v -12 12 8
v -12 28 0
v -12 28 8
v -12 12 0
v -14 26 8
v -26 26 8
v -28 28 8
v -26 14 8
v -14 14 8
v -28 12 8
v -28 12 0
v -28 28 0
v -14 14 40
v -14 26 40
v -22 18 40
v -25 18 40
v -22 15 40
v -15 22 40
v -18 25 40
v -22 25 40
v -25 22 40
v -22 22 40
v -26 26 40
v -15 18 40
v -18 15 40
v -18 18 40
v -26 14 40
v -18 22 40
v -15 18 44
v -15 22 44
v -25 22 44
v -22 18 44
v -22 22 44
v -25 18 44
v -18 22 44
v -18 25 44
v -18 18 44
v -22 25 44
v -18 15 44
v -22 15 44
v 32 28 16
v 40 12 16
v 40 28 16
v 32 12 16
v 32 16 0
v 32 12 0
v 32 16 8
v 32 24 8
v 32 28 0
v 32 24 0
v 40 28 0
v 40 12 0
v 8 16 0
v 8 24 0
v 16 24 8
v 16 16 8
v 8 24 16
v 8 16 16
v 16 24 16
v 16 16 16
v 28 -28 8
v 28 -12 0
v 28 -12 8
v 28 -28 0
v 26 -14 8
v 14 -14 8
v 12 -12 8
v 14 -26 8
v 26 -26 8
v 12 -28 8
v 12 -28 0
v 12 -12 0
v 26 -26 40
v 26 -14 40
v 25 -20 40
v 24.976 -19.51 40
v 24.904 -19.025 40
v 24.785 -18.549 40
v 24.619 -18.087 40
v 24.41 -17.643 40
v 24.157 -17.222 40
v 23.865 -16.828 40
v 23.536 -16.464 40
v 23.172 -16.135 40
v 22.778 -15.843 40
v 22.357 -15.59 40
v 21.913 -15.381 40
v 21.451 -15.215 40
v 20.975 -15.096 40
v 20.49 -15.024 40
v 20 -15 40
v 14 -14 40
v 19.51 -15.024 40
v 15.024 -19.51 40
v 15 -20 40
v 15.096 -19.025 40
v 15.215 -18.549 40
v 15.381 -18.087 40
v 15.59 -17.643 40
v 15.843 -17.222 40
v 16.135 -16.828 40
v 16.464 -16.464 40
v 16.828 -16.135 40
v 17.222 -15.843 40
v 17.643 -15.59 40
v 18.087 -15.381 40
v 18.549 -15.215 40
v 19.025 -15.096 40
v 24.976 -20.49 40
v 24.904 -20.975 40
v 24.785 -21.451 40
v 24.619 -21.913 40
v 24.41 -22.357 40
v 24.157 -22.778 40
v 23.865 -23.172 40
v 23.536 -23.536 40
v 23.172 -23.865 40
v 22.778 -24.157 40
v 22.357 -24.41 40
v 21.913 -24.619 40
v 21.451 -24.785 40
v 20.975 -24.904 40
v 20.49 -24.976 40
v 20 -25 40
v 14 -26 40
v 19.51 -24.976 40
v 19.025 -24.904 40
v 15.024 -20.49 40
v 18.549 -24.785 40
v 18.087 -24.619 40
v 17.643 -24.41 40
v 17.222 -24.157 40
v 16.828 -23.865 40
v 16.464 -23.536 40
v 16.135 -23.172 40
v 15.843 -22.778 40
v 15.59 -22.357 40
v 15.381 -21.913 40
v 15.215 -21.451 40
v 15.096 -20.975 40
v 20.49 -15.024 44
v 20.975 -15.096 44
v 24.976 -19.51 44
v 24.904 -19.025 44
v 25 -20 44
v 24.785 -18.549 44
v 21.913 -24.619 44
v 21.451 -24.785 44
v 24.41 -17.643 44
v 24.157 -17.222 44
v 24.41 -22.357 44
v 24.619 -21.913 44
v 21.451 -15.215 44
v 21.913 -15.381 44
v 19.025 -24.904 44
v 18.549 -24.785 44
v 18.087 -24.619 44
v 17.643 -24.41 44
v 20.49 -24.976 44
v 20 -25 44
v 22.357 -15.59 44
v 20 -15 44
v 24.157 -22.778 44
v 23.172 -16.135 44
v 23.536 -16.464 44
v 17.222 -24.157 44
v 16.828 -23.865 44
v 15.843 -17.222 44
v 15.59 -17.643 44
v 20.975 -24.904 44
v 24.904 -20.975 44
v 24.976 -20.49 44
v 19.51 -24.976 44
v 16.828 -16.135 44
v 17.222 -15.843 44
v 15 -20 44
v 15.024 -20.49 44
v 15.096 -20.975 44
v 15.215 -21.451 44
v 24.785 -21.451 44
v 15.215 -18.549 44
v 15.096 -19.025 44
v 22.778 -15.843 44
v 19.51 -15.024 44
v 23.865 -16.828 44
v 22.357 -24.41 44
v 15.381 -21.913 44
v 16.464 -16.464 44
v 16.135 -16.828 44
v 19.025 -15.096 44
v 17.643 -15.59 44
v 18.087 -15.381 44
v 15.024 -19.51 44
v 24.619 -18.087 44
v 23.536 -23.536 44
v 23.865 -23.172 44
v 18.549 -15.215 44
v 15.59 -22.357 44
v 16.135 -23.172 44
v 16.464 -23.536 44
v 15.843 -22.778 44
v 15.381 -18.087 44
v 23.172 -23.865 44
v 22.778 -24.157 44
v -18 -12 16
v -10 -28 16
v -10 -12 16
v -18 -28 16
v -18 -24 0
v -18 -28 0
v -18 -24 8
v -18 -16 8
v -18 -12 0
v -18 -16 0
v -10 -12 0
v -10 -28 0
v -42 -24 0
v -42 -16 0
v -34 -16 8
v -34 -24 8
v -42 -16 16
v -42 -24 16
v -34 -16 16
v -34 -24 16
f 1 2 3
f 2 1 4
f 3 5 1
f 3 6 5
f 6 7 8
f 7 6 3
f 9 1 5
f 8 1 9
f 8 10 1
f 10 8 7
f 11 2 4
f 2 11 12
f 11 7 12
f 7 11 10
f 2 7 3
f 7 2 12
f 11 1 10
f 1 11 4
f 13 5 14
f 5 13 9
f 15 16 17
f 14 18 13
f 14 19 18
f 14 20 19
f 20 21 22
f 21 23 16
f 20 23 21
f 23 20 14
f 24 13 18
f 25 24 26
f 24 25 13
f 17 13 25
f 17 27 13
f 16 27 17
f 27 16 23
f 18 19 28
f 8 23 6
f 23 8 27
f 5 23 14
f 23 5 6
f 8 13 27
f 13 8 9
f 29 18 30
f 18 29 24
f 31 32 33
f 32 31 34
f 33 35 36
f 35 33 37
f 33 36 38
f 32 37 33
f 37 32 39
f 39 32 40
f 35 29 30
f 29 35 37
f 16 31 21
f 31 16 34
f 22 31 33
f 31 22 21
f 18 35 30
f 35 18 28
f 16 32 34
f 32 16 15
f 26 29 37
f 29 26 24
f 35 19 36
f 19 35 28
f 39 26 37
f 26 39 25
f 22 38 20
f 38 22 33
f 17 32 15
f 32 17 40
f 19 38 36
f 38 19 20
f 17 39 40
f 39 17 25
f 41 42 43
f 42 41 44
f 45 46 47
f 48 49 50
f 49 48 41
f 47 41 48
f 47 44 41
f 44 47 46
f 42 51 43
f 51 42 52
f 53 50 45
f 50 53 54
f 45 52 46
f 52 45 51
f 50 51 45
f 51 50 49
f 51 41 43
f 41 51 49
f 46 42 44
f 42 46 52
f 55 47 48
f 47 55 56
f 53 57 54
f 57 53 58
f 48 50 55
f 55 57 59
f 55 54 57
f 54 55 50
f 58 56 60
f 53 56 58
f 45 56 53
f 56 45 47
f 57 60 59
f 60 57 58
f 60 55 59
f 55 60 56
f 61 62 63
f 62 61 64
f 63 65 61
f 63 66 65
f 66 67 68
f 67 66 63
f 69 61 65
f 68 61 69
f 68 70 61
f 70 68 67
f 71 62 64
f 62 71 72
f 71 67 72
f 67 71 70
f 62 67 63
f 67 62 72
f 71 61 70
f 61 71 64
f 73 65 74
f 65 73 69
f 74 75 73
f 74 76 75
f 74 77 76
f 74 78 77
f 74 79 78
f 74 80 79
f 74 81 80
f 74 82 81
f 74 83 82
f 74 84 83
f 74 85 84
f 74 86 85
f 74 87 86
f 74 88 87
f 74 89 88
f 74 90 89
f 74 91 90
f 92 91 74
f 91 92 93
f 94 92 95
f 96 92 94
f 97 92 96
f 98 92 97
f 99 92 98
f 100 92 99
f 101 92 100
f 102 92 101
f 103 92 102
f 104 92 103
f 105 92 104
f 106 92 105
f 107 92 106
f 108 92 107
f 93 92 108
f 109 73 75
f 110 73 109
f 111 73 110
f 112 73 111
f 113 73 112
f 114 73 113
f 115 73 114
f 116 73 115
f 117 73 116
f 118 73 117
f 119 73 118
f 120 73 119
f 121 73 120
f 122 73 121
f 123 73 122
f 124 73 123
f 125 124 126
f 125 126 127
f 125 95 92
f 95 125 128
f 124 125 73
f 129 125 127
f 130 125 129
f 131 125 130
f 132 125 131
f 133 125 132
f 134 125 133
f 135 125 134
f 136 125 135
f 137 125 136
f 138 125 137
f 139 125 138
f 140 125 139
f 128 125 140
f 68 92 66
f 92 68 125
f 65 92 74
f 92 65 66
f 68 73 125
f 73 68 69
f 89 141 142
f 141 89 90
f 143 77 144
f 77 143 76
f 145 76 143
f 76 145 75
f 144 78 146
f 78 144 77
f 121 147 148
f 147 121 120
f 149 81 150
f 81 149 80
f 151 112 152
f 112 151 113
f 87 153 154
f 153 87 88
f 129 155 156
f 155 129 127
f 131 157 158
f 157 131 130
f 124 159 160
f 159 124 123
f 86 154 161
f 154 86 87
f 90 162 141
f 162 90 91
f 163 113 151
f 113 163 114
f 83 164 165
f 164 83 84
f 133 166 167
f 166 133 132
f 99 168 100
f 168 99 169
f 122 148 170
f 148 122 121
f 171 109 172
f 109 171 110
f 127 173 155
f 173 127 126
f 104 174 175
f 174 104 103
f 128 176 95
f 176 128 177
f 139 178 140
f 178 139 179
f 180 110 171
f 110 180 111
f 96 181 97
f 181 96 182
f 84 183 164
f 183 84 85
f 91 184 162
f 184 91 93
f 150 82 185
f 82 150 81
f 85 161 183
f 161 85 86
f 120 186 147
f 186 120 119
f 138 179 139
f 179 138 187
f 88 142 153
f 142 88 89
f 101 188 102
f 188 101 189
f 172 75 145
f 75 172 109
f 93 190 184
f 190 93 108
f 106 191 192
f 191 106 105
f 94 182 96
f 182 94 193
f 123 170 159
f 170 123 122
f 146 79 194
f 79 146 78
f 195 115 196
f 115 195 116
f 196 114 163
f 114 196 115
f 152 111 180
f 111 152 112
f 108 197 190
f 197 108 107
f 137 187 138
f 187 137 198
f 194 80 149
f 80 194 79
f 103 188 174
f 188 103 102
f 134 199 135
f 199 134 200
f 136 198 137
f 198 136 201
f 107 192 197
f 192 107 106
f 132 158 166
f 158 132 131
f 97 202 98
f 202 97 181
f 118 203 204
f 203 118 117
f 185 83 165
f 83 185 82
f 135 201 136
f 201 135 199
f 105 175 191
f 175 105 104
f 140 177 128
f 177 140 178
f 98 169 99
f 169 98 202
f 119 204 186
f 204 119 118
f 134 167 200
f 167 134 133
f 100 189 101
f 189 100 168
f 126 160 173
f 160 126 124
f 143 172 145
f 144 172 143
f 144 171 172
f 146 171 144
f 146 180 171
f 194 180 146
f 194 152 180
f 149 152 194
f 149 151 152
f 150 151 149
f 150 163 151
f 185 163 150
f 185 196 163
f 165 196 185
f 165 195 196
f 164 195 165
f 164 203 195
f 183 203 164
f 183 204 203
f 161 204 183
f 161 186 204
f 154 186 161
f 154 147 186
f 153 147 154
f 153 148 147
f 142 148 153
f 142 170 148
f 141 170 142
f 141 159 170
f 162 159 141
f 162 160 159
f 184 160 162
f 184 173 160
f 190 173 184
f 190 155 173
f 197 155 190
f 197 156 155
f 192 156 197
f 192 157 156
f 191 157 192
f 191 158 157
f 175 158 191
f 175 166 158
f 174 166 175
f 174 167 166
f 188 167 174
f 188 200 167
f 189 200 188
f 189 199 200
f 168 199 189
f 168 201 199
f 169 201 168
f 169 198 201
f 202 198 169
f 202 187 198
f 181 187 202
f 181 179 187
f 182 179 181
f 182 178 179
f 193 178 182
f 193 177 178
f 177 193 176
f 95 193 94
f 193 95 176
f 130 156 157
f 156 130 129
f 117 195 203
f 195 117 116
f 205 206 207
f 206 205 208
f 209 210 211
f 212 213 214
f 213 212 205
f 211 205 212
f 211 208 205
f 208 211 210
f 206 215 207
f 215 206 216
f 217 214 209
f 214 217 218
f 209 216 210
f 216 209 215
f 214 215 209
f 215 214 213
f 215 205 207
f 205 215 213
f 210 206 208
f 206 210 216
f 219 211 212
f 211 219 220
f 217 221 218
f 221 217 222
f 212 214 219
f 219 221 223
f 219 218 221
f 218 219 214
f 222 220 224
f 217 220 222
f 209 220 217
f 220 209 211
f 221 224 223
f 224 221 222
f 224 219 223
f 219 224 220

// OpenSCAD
$fn=64;

//pieces();
//print_pawns4();
//print_pieces1();
print_pieces2();
//chess_set();

module base() {
	translate([0,0,4]) { cube([16,16,8],center=true); }
}


module king() {
	base();
	translate([0,0,24]) { cube([12,12,32], center=true); }
	translate([0,0,42]) { cube([10,4,4], center=true); }
	translate([0,0,42]) { cube([4,10,4], center=true); }
}

module queen() {
	base();
	translate([0,0,24]) { cube([12,12,32], center=true); }
	translate([0,0,42]) { cylinder(d=10,h=4, center=true); }
}

module bishop() {
	base();
	hull() {
		translate([0,0,6]) { cube([12,12,4], center=true); }
		translate([0,0,30]) { cube([4,4,4], center=true); }
	}
}

module knight() {
	base();
	translate([-4,0,20]) { cube([8,8,24], center=true); } 
	translate([4,0,28]) { cube([8,8,8], center=true); } 
}

module rook() {
	base();
	translate([0,0,20]) { cube([12,12,24], center=true); }
}

module pawn() {
	base();
	translate([0,0,14]) { cube([12,12,12], center=true); }
}

module pieces() {
	translate([0,-50,0]) { pawn(); }
	translate([0,-30,0]) { rook(); }
	translate([0,-10,0]) { bishop(); }
	translate([0,10,0]) { knight(); }
	translate([0,30,0]) { queen(); }
	translate([0,50,0]) { king(); }
}


module print_pawns4() {
	translate([-20,20,0]) { pawn(); }
	translate([20,20,0]) { pawn(); }
	translate([20,-20,0]) { pawn(); }
	translate([-20,-20,0]) { pawn(); }
}

module print_pieces1() {
	translate([-20,20,0]) { rook(); }
	translate([20,20,0]) { rook(); }
	translate([20,-20,0]) { bishop(); }
	translate([-20,-20,0]) { bishop(); }
}

module print_pieces2() {
	translate([-20,20,0]) { king(); }
	translate([40,20,8]) { rotate([0,-90,0]) { knight(); } }
	translate([20,-20,0]) { queen(); }
	translate([-10,-20,8]) { rotate([0,-90,0]) { knight(); } }
}

module chess_set() {
	translate([0,-70,0]) { rook(); }
	translate([0,-50,0]) { knight(); }
	translate([0,-30,0]) { bishop(); }
	translate([0,-10,0]) { queen(); }
	translate([0,10,0]) { king(); }
	translate([0,30,0]) { bishop(); }
	translate([0,50,0]) { knight(); }
	translate([0,70,0]) { rook(); }	
	translate([20,-70,0]) { pawn(); }
	translate([20,-50,0]) { pawn(); }
	translate([20,-30,0]) { pawn(); }
	translate([20,-10,0]) { pawn(); }
	translate([20,10,0]) { pawn(); }
	translate([20,30,0]) { pawn(); }
	translate([20,50,0]) { pawn(); }
	translate([20,70,0]) { pawn(); }
}
